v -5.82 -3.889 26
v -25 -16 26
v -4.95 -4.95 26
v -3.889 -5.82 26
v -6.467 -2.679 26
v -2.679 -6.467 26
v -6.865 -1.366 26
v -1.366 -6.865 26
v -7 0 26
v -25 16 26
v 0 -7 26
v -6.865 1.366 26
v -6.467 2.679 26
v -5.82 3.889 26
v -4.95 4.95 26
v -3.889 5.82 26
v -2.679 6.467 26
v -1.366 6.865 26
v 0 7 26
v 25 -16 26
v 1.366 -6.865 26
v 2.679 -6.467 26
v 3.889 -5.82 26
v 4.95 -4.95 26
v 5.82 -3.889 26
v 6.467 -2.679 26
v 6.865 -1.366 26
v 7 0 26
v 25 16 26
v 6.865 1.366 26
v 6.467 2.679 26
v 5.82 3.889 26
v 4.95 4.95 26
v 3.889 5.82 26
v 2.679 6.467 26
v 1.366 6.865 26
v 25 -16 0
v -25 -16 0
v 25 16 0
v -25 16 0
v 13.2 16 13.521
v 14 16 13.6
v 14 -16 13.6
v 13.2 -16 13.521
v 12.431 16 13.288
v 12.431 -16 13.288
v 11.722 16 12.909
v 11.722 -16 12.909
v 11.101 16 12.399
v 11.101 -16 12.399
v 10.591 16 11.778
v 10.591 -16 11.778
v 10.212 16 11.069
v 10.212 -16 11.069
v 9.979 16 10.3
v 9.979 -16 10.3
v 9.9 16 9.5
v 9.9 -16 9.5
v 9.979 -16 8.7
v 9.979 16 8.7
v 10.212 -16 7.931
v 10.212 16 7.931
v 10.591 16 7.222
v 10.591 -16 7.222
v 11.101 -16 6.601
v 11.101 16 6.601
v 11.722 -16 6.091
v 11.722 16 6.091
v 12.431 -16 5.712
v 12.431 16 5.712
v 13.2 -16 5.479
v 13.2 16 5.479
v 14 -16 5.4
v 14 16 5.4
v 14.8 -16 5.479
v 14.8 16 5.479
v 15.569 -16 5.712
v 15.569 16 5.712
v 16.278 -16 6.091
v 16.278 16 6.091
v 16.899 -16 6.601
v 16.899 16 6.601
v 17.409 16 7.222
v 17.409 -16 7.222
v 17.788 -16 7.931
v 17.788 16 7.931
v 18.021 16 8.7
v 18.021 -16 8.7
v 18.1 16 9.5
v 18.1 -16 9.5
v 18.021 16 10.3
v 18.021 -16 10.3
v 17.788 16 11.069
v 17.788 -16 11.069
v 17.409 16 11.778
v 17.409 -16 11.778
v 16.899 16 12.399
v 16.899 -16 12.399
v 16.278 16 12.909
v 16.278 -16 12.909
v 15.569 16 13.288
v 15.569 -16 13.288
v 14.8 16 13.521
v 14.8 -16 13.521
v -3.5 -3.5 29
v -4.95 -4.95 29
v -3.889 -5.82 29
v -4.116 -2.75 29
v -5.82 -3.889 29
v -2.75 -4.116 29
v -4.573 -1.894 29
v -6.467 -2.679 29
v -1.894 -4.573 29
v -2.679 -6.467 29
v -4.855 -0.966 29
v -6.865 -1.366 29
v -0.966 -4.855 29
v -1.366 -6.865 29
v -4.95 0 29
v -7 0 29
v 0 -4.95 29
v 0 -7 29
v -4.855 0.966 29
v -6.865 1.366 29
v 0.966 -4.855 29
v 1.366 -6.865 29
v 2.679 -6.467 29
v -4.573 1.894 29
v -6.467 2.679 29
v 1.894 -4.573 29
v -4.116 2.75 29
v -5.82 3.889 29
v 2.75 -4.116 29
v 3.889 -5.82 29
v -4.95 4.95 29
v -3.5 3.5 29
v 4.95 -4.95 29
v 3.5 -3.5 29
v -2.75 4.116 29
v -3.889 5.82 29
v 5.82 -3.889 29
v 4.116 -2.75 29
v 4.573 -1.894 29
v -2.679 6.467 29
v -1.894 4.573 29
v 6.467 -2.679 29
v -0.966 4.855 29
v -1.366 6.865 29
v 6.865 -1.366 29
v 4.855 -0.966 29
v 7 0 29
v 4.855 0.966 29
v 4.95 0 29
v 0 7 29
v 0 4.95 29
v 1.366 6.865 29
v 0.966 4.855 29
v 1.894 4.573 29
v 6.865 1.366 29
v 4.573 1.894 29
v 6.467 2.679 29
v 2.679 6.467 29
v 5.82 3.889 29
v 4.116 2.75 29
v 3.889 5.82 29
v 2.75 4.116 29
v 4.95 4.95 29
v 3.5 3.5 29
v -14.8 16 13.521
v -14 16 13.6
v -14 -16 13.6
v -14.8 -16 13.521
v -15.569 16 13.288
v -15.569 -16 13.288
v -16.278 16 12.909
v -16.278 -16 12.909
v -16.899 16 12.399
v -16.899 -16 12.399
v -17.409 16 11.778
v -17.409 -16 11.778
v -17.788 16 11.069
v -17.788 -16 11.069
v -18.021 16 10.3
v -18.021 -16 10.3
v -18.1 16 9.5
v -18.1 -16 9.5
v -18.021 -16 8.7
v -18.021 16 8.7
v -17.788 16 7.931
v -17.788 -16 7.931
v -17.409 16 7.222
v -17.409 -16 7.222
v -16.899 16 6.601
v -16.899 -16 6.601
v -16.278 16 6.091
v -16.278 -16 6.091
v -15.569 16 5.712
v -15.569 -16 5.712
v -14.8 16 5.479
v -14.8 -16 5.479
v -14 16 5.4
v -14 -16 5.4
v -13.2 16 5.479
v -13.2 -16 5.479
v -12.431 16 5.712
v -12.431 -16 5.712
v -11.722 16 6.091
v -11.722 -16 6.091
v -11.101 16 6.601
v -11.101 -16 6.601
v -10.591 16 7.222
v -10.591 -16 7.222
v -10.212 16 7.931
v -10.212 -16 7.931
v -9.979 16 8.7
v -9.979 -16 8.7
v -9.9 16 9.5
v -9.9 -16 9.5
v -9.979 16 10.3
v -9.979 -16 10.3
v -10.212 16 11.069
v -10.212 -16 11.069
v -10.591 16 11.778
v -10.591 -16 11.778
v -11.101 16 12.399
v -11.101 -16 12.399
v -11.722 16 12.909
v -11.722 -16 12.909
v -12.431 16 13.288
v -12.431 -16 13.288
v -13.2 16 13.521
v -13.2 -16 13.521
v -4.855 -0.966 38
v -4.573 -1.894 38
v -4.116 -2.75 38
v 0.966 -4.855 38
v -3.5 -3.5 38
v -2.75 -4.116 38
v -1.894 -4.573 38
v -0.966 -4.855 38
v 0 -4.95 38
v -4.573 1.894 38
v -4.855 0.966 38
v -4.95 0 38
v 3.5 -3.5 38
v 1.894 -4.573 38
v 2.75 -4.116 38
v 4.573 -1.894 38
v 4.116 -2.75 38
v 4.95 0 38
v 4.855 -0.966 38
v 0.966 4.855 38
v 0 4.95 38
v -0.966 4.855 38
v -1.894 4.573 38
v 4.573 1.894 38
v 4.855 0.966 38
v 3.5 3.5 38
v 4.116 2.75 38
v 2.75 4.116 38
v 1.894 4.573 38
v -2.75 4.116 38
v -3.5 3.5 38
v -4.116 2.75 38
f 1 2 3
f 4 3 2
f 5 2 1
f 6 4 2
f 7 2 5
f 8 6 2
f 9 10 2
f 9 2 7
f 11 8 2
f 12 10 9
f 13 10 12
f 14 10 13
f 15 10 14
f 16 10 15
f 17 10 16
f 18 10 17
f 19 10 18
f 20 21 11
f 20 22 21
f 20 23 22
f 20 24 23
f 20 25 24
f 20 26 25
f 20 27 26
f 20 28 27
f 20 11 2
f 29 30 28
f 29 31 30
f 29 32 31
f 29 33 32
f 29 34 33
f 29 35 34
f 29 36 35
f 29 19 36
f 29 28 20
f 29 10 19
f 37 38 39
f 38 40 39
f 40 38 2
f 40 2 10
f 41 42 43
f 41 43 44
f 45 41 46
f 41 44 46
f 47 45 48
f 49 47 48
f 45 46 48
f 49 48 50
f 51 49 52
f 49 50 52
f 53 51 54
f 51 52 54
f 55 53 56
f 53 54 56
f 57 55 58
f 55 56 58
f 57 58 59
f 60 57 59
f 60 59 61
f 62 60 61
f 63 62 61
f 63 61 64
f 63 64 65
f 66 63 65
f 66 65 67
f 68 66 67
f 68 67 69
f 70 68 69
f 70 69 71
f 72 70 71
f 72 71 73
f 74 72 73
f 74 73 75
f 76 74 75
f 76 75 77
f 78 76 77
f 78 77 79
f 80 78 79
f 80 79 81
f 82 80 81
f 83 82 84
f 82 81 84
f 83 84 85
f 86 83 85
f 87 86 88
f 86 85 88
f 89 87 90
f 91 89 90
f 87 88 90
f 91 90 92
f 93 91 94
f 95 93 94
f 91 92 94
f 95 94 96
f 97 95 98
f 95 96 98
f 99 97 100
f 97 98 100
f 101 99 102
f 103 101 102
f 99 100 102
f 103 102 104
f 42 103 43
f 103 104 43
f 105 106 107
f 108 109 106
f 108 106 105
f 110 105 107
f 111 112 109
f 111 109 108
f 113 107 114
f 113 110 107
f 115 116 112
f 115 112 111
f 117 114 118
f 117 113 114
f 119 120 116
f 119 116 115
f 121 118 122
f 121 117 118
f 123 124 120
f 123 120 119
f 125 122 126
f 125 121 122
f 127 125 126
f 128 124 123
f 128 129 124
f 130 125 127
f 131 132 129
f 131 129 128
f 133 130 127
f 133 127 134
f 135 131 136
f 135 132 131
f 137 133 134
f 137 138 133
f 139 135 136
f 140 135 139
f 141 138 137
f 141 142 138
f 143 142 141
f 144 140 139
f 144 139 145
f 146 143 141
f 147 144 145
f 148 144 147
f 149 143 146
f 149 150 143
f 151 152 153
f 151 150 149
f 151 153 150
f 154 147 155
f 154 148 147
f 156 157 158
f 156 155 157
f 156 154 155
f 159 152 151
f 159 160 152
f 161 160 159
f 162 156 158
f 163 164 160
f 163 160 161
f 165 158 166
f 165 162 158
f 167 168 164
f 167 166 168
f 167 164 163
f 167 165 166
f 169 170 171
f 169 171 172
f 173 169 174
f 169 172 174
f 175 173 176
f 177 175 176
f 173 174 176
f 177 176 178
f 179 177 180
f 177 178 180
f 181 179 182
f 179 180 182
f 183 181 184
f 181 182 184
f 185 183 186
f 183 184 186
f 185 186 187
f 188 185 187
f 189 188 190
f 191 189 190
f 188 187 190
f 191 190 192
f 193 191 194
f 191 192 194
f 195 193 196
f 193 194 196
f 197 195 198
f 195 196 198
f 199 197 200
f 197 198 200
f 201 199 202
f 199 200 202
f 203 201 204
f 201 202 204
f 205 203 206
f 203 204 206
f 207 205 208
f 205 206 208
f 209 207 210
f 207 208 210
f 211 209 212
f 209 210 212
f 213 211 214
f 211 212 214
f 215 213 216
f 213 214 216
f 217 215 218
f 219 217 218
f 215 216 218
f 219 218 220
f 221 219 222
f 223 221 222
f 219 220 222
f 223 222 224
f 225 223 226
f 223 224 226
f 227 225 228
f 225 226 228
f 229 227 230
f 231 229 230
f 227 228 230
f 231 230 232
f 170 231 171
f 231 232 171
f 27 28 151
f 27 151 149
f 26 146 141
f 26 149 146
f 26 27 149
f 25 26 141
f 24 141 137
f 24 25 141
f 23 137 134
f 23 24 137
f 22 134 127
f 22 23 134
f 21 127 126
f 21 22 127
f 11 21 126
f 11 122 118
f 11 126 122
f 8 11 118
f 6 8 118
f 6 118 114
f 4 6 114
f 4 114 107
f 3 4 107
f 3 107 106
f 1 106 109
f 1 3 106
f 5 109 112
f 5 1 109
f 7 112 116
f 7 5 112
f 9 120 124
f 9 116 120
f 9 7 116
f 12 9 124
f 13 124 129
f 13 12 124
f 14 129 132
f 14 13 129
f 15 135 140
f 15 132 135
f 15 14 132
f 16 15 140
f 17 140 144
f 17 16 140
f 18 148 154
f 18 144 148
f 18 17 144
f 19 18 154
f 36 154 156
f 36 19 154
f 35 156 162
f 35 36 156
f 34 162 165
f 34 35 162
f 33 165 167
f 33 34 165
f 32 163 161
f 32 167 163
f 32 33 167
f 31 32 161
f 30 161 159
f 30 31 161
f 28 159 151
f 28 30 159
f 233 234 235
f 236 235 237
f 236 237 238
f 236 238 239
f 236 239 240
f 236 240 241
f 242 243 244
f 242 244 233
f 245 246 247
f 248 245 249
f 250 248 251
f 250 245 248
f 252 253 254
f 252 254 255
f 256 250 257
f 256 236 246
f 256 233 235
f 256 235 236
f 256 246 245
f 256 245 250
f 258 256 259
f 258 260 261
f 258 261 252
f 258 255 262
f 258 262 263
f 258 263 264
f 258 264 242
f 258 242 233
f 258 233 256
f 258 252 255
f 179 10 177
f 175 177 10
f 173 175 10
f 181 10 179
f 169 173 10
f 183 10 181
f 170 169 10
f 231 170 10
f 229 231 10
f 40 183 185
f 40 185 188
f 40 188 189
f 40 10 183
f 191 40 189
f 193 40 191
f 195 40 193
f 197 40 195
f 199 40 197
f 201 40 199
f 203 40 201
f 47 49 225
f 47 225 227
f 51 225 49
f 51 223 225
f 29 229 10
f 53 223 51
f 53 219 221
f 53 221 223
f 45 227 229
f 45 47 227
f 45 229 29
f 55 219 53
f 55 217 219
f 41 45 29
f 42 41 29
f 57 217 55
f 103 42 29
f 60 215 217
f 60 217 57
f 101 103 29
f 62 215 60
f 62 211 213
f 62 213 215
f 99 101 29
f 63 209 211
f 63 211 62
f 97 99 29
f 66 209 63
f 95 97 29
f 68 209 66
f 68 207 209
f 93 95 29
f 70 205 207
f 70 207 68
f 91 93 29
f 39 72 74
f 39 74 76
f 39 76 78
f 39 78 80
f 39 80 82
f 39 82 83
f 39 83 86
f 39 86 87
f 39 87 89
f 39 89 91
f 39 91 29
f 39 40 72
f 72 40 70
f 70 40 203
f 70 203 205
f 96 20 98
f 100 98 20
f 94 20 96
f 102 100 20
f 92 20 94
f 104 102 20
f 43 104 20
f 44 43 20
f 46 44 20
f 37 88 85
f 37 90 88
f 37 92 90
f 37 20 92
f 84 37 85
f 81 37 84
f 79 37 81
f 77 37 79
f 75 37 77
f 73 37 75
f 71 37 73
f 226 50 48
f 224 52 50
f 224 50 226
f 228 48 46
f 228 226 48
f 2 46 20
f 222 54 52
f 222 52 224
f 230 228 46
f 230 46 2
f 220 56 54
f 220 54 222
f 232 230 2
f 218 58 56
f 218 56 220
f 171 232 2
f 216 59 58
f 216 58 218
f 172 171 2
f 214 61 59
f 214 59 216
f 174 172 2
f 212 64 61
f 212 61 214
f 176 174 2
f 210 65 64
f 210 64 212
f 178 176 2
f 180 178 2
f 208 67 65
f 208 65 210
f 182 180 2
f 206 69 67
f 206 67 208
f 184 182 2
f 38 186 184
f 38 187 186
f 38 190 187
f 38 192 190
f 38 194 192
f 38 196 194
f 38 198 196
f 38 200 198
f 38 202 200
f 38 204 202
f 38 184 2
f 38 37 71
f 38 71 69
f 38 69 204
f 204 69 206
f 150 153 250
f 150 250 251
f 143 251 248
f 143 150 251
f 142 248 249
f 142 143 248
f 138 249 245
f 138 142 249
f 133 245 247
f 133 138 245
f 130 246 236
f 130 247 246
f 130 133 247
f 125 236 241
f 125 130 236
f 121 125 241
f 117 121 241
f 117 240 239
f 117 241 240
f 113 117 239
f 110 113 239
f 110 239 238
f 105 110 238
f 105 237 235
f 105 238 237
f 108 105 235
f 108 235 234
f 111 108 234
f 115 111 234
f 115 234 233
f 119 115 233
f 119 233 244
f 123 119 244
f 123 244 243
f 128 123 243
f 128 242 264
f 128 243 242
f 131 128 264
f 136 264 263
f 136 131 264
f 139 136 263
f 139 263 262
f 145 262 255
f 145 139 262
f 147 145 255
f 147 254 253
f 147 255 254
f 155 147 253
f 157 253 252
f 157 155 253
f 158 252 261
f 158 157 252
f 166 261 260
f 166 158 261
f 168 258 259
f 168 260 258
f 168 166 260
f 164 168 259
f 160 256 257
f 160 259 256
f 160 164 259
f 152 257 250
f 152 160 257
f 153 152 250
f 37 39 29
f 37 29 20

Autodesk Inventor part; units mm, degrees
ref_plane "YZ Plane" through (0, 0, 0) normal (1, 0, 0) x (0, 1, 0)
ref_plane "XZ Plane" through (0, 0, 0) normal (0, 1, 0) x (-1, 0, 0)
ref_plane "XY Plane" through (0, 0, 0) normal (0, 0, 1) x (1, 0, 0)
sketch "Sketch2" plane through (0, 0, 0) normal (0, 0, 1) x (1, 0, 0)
  line L0 (-25, 16) -> (25, 16)
  line L1 (25, 16) -> (25, -16)
  line L2 (25, -16) -> (-25, -16)
  line L3 (-25, -16) -> (-25, 16)
  line L4 (-25, 16) -> (25, -16) construction
  line L5 (25, 16) -> (-25, -16) construction
  point P0 (0, 0)
  dimension "d4" = 32
  dimension "d5" = 50
extrude "Extrusion1" add sketch "Sketch2" along normal blind 26
sketch "Sketch3" plane through (0, 0, 26) normal (0, 0, 1) x (1, 0, 0)
  circle A0 centre (0, 0) radius 7
  dimension "d8" = 14
extrude "Extrusion2" add sketch "Sketch3" along normal blind 3
sketch "Sketch4" plane through (0, 0, 29) normal (0, 0, 1) x (1, 0, 0)
  circle A0 centre (0, 0) radius 4.95
  dimension "d11" = 9.9
extrude "Extrusion3" add sketch "Sketch4" along normal blind 9
sketch "Sketch6" plane through (-25, 16, 0) normal (0, 1, 0) x (1, 0, 0)
  line L0 (11, -9.5) -> (0, -9.5) construction
  line L1 (0, 0) -> (0, -26) projected
  line L2 (39, -9.5) -> (50, -9.5) construction
  line L3 (50, 0) -> (50, -26) projected
  line L4 (50, 0) -> (0, 0) projected
  point P0 (25, 0)
  point P1 (44.5, -9.5)
  dimension "d29" = 28
  dimension "d30" = 9.5
hole "Hole3" at (-14, 16, 9.5) at (14, 16, 9.5) direction (0, -1, 0) diameter 8.2 end through all
properties part number "13042026-03"
